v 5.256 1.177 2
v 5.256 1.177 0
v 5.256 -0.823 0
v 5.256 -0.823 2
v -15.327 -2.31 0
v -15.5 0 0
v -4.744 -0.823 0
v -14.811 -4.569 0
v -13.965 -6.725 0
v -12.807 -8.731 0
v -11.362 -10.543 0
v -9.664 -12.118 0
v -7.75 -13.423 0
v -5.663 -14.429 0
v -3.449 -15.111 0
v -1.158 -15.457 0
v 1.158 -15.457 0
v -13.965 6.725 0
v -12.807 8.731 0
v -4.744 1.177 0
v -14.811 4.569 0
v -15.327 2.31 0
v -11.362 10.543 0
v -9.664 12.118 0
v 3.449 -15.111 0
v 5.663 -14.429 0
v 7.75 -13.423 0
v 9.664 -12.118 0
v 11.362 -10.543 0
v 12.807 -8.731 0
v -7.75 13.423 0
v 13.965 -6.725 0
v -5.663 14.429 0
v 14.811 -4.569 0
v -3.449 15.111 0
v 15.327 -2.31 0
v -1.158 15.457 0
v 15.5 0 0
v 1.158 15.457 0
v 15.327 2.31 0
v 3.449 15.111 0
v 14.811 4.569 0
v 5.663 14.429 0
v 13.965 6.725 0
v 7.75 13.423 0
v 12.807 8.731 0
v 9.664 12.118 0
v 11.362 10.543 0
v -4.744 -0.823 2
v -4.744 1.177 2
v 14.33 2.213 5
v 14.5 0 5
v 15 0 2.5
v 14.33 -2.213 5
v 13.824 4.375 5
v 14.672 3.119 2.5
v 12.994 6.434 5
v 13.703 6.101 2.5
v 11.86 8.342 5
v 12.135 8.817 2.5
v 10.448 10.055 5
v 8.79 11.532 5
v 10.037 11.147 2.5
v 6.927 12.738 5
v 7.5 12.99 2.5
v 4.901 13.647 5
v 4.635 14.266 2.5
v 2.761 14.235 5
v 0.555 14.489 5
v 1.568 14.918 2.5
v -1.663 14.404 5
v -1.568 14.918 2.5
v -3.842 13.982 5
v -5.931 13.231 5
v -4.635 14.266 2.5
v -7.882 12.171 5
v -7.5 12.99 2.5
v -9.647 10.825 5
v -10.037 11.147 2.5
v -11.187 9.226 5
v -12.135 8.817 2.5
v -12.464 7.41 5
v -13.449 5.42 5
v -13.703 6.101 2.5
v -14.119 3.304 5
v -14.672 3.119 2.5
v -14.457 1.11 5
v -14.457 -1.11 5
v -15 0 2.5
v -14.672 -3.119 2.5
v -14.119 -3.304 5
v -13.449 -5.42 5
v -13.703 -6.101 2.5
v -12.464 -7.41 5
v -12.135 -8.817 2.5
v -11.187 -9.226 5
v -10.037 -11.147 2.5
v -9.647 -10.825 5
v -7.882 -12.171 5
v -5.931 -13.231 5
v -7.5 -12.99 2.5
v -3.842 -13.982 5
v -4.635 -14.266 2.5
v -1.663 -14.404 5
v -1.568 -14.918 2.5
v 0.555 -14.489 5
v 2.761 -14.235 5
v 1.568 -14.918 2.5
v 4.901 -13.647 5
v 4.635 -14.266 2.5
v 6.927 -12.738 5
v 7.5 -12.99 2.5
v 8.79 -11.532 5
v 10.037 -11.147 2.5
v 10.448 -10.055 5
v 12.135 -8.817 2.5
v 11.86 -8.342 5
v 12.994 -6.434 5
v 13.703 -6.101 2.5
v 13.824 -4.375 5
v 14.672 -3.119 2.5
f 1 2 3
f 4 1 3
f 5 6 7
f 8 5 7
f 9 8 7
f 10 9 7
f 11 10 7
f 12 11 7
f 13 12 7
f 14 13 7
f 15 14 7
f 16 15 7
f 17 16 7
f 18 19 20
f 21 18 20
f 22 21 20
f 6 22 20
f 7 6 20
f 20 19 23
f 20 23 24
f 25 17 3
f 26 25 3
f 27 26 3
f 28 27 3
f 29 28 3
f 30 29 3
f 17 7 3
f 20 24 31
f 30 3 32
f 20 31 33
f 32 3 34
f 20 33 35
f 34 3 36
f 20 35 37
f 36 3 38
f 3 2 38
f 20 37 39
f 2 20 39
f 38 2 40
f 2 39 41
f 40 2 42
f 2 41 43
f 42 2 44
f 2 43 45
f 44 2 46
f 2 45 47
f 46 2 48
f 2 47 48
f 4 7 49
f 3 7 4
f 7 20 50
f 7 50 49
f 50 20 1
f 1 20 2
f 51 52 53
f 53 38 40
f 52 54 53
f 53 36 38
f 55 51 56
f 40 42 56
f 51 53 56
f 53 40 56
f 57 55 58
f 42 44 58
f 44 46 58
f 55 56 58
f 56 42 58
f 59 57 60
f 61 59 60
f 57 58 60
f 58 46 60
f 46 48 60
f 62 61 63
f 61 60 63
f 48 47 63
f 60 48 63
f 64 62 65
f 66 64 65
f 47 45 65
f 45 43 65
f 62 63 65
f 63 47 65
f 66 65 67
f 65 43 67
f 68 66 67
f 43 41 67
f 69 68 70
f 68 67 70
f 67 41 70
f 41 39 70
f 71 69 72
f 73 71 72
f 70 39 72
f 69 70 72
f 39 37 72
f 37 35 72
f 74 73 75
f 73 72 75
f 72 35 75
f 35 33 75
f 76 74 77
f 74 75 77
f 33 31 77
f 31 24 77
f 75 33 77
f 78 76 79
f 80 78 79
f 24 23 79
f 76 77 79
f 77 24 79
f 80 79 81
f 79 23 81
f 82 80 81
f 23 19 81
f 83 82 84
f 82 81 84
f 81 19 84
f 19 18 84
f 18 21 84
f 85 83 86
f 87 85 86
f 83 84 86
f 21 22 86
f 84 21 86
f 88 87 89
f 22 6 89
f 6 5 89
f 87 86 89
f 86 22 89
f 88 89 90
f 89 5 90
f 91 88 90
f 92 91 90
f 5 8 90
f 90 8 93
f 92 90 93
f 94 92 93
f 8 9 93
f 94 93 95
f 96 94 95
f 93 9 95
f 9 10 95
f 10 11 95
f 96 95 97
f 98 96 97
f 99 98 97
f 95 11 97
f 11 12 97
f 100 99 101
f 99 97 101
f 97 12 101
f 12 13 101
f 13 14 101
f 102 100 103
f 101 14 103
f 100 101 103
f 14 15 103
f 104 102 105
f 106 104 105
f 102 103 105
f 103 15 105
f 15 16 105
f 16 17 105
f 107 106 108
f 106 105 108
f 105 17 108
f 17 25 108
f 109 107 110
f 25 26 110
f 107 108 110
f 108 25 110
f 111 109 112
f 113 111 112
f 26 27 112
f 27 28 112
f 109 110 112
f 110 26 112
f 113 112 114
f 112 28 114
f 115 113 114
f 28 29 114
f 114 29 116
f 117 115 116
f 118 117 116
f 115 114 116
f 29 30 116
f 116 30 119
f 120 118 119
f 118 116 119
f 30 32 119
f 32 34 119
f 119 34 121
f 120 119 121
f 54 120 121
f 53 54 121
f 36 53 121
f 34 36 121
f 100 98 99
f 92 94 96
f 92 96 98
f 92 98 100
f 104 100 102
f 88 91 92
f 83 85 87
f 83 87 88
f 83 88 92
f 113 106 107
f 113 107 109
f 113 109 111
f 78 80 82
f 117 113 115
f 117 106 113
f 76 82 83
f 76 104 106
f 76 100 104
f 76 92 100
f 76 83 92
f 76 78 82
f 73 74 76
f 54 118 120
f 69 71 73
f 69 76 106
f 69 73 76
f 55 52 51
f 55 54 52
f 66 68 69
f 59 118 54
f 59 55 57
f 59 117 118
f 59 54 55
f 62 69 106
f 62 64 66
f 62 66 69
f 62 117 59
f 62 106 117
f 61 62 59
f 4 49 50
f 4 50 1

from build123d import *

# Parameters (mm, degrees)
F0_R     = 15.5
F1_DEPTH = 5
F2_SIZE2 = 4.99999
F2_SIZE  = 0.99999
F3_W     = 10
F3_H     = 2
F4_DEPTH = 2


# Not quite as in the source:
# - a fillet or chamfer is up to 0.001 mm smaller than in the source, because OpenCascade refuses the exact size


with BuildPart() as f1:
    # F0 (on Top) → F1 (new body)
    with BuildSketch(Plane.XY):
        Circle(F0_R)
    extrude(amount=F1_DEPTH)

    # F2 (size 1 and 5 in the source; OpenCascade refuses exactly that, so slightly less here)
    f2_edges = [f1.edges().sort_by_distance(p)[0] for p in [
        (-15.5, 0, 5),
    ]]
    f2_side = f1.faces().sort_by_distance((0, 0, 5))[0]
    chamfer(f2_edges, length=F2_SIZE, length2=F2_SIZE2, reference=f2_side)

    # F3 (on face) → F4 (cut)
    with BuildSketch(Plane(origin=(0, 0, 0), x_dir=(1, 0, 0), z_dir=(0, 0, -1))):
        with Locations((0.2559603993, -0.1766888017)):
            Rectangle(F3_W, F3_H)
    extrude(amount=-F4_DEPTH, mode=Mode.SUBTRACT)


solid = f1.part
